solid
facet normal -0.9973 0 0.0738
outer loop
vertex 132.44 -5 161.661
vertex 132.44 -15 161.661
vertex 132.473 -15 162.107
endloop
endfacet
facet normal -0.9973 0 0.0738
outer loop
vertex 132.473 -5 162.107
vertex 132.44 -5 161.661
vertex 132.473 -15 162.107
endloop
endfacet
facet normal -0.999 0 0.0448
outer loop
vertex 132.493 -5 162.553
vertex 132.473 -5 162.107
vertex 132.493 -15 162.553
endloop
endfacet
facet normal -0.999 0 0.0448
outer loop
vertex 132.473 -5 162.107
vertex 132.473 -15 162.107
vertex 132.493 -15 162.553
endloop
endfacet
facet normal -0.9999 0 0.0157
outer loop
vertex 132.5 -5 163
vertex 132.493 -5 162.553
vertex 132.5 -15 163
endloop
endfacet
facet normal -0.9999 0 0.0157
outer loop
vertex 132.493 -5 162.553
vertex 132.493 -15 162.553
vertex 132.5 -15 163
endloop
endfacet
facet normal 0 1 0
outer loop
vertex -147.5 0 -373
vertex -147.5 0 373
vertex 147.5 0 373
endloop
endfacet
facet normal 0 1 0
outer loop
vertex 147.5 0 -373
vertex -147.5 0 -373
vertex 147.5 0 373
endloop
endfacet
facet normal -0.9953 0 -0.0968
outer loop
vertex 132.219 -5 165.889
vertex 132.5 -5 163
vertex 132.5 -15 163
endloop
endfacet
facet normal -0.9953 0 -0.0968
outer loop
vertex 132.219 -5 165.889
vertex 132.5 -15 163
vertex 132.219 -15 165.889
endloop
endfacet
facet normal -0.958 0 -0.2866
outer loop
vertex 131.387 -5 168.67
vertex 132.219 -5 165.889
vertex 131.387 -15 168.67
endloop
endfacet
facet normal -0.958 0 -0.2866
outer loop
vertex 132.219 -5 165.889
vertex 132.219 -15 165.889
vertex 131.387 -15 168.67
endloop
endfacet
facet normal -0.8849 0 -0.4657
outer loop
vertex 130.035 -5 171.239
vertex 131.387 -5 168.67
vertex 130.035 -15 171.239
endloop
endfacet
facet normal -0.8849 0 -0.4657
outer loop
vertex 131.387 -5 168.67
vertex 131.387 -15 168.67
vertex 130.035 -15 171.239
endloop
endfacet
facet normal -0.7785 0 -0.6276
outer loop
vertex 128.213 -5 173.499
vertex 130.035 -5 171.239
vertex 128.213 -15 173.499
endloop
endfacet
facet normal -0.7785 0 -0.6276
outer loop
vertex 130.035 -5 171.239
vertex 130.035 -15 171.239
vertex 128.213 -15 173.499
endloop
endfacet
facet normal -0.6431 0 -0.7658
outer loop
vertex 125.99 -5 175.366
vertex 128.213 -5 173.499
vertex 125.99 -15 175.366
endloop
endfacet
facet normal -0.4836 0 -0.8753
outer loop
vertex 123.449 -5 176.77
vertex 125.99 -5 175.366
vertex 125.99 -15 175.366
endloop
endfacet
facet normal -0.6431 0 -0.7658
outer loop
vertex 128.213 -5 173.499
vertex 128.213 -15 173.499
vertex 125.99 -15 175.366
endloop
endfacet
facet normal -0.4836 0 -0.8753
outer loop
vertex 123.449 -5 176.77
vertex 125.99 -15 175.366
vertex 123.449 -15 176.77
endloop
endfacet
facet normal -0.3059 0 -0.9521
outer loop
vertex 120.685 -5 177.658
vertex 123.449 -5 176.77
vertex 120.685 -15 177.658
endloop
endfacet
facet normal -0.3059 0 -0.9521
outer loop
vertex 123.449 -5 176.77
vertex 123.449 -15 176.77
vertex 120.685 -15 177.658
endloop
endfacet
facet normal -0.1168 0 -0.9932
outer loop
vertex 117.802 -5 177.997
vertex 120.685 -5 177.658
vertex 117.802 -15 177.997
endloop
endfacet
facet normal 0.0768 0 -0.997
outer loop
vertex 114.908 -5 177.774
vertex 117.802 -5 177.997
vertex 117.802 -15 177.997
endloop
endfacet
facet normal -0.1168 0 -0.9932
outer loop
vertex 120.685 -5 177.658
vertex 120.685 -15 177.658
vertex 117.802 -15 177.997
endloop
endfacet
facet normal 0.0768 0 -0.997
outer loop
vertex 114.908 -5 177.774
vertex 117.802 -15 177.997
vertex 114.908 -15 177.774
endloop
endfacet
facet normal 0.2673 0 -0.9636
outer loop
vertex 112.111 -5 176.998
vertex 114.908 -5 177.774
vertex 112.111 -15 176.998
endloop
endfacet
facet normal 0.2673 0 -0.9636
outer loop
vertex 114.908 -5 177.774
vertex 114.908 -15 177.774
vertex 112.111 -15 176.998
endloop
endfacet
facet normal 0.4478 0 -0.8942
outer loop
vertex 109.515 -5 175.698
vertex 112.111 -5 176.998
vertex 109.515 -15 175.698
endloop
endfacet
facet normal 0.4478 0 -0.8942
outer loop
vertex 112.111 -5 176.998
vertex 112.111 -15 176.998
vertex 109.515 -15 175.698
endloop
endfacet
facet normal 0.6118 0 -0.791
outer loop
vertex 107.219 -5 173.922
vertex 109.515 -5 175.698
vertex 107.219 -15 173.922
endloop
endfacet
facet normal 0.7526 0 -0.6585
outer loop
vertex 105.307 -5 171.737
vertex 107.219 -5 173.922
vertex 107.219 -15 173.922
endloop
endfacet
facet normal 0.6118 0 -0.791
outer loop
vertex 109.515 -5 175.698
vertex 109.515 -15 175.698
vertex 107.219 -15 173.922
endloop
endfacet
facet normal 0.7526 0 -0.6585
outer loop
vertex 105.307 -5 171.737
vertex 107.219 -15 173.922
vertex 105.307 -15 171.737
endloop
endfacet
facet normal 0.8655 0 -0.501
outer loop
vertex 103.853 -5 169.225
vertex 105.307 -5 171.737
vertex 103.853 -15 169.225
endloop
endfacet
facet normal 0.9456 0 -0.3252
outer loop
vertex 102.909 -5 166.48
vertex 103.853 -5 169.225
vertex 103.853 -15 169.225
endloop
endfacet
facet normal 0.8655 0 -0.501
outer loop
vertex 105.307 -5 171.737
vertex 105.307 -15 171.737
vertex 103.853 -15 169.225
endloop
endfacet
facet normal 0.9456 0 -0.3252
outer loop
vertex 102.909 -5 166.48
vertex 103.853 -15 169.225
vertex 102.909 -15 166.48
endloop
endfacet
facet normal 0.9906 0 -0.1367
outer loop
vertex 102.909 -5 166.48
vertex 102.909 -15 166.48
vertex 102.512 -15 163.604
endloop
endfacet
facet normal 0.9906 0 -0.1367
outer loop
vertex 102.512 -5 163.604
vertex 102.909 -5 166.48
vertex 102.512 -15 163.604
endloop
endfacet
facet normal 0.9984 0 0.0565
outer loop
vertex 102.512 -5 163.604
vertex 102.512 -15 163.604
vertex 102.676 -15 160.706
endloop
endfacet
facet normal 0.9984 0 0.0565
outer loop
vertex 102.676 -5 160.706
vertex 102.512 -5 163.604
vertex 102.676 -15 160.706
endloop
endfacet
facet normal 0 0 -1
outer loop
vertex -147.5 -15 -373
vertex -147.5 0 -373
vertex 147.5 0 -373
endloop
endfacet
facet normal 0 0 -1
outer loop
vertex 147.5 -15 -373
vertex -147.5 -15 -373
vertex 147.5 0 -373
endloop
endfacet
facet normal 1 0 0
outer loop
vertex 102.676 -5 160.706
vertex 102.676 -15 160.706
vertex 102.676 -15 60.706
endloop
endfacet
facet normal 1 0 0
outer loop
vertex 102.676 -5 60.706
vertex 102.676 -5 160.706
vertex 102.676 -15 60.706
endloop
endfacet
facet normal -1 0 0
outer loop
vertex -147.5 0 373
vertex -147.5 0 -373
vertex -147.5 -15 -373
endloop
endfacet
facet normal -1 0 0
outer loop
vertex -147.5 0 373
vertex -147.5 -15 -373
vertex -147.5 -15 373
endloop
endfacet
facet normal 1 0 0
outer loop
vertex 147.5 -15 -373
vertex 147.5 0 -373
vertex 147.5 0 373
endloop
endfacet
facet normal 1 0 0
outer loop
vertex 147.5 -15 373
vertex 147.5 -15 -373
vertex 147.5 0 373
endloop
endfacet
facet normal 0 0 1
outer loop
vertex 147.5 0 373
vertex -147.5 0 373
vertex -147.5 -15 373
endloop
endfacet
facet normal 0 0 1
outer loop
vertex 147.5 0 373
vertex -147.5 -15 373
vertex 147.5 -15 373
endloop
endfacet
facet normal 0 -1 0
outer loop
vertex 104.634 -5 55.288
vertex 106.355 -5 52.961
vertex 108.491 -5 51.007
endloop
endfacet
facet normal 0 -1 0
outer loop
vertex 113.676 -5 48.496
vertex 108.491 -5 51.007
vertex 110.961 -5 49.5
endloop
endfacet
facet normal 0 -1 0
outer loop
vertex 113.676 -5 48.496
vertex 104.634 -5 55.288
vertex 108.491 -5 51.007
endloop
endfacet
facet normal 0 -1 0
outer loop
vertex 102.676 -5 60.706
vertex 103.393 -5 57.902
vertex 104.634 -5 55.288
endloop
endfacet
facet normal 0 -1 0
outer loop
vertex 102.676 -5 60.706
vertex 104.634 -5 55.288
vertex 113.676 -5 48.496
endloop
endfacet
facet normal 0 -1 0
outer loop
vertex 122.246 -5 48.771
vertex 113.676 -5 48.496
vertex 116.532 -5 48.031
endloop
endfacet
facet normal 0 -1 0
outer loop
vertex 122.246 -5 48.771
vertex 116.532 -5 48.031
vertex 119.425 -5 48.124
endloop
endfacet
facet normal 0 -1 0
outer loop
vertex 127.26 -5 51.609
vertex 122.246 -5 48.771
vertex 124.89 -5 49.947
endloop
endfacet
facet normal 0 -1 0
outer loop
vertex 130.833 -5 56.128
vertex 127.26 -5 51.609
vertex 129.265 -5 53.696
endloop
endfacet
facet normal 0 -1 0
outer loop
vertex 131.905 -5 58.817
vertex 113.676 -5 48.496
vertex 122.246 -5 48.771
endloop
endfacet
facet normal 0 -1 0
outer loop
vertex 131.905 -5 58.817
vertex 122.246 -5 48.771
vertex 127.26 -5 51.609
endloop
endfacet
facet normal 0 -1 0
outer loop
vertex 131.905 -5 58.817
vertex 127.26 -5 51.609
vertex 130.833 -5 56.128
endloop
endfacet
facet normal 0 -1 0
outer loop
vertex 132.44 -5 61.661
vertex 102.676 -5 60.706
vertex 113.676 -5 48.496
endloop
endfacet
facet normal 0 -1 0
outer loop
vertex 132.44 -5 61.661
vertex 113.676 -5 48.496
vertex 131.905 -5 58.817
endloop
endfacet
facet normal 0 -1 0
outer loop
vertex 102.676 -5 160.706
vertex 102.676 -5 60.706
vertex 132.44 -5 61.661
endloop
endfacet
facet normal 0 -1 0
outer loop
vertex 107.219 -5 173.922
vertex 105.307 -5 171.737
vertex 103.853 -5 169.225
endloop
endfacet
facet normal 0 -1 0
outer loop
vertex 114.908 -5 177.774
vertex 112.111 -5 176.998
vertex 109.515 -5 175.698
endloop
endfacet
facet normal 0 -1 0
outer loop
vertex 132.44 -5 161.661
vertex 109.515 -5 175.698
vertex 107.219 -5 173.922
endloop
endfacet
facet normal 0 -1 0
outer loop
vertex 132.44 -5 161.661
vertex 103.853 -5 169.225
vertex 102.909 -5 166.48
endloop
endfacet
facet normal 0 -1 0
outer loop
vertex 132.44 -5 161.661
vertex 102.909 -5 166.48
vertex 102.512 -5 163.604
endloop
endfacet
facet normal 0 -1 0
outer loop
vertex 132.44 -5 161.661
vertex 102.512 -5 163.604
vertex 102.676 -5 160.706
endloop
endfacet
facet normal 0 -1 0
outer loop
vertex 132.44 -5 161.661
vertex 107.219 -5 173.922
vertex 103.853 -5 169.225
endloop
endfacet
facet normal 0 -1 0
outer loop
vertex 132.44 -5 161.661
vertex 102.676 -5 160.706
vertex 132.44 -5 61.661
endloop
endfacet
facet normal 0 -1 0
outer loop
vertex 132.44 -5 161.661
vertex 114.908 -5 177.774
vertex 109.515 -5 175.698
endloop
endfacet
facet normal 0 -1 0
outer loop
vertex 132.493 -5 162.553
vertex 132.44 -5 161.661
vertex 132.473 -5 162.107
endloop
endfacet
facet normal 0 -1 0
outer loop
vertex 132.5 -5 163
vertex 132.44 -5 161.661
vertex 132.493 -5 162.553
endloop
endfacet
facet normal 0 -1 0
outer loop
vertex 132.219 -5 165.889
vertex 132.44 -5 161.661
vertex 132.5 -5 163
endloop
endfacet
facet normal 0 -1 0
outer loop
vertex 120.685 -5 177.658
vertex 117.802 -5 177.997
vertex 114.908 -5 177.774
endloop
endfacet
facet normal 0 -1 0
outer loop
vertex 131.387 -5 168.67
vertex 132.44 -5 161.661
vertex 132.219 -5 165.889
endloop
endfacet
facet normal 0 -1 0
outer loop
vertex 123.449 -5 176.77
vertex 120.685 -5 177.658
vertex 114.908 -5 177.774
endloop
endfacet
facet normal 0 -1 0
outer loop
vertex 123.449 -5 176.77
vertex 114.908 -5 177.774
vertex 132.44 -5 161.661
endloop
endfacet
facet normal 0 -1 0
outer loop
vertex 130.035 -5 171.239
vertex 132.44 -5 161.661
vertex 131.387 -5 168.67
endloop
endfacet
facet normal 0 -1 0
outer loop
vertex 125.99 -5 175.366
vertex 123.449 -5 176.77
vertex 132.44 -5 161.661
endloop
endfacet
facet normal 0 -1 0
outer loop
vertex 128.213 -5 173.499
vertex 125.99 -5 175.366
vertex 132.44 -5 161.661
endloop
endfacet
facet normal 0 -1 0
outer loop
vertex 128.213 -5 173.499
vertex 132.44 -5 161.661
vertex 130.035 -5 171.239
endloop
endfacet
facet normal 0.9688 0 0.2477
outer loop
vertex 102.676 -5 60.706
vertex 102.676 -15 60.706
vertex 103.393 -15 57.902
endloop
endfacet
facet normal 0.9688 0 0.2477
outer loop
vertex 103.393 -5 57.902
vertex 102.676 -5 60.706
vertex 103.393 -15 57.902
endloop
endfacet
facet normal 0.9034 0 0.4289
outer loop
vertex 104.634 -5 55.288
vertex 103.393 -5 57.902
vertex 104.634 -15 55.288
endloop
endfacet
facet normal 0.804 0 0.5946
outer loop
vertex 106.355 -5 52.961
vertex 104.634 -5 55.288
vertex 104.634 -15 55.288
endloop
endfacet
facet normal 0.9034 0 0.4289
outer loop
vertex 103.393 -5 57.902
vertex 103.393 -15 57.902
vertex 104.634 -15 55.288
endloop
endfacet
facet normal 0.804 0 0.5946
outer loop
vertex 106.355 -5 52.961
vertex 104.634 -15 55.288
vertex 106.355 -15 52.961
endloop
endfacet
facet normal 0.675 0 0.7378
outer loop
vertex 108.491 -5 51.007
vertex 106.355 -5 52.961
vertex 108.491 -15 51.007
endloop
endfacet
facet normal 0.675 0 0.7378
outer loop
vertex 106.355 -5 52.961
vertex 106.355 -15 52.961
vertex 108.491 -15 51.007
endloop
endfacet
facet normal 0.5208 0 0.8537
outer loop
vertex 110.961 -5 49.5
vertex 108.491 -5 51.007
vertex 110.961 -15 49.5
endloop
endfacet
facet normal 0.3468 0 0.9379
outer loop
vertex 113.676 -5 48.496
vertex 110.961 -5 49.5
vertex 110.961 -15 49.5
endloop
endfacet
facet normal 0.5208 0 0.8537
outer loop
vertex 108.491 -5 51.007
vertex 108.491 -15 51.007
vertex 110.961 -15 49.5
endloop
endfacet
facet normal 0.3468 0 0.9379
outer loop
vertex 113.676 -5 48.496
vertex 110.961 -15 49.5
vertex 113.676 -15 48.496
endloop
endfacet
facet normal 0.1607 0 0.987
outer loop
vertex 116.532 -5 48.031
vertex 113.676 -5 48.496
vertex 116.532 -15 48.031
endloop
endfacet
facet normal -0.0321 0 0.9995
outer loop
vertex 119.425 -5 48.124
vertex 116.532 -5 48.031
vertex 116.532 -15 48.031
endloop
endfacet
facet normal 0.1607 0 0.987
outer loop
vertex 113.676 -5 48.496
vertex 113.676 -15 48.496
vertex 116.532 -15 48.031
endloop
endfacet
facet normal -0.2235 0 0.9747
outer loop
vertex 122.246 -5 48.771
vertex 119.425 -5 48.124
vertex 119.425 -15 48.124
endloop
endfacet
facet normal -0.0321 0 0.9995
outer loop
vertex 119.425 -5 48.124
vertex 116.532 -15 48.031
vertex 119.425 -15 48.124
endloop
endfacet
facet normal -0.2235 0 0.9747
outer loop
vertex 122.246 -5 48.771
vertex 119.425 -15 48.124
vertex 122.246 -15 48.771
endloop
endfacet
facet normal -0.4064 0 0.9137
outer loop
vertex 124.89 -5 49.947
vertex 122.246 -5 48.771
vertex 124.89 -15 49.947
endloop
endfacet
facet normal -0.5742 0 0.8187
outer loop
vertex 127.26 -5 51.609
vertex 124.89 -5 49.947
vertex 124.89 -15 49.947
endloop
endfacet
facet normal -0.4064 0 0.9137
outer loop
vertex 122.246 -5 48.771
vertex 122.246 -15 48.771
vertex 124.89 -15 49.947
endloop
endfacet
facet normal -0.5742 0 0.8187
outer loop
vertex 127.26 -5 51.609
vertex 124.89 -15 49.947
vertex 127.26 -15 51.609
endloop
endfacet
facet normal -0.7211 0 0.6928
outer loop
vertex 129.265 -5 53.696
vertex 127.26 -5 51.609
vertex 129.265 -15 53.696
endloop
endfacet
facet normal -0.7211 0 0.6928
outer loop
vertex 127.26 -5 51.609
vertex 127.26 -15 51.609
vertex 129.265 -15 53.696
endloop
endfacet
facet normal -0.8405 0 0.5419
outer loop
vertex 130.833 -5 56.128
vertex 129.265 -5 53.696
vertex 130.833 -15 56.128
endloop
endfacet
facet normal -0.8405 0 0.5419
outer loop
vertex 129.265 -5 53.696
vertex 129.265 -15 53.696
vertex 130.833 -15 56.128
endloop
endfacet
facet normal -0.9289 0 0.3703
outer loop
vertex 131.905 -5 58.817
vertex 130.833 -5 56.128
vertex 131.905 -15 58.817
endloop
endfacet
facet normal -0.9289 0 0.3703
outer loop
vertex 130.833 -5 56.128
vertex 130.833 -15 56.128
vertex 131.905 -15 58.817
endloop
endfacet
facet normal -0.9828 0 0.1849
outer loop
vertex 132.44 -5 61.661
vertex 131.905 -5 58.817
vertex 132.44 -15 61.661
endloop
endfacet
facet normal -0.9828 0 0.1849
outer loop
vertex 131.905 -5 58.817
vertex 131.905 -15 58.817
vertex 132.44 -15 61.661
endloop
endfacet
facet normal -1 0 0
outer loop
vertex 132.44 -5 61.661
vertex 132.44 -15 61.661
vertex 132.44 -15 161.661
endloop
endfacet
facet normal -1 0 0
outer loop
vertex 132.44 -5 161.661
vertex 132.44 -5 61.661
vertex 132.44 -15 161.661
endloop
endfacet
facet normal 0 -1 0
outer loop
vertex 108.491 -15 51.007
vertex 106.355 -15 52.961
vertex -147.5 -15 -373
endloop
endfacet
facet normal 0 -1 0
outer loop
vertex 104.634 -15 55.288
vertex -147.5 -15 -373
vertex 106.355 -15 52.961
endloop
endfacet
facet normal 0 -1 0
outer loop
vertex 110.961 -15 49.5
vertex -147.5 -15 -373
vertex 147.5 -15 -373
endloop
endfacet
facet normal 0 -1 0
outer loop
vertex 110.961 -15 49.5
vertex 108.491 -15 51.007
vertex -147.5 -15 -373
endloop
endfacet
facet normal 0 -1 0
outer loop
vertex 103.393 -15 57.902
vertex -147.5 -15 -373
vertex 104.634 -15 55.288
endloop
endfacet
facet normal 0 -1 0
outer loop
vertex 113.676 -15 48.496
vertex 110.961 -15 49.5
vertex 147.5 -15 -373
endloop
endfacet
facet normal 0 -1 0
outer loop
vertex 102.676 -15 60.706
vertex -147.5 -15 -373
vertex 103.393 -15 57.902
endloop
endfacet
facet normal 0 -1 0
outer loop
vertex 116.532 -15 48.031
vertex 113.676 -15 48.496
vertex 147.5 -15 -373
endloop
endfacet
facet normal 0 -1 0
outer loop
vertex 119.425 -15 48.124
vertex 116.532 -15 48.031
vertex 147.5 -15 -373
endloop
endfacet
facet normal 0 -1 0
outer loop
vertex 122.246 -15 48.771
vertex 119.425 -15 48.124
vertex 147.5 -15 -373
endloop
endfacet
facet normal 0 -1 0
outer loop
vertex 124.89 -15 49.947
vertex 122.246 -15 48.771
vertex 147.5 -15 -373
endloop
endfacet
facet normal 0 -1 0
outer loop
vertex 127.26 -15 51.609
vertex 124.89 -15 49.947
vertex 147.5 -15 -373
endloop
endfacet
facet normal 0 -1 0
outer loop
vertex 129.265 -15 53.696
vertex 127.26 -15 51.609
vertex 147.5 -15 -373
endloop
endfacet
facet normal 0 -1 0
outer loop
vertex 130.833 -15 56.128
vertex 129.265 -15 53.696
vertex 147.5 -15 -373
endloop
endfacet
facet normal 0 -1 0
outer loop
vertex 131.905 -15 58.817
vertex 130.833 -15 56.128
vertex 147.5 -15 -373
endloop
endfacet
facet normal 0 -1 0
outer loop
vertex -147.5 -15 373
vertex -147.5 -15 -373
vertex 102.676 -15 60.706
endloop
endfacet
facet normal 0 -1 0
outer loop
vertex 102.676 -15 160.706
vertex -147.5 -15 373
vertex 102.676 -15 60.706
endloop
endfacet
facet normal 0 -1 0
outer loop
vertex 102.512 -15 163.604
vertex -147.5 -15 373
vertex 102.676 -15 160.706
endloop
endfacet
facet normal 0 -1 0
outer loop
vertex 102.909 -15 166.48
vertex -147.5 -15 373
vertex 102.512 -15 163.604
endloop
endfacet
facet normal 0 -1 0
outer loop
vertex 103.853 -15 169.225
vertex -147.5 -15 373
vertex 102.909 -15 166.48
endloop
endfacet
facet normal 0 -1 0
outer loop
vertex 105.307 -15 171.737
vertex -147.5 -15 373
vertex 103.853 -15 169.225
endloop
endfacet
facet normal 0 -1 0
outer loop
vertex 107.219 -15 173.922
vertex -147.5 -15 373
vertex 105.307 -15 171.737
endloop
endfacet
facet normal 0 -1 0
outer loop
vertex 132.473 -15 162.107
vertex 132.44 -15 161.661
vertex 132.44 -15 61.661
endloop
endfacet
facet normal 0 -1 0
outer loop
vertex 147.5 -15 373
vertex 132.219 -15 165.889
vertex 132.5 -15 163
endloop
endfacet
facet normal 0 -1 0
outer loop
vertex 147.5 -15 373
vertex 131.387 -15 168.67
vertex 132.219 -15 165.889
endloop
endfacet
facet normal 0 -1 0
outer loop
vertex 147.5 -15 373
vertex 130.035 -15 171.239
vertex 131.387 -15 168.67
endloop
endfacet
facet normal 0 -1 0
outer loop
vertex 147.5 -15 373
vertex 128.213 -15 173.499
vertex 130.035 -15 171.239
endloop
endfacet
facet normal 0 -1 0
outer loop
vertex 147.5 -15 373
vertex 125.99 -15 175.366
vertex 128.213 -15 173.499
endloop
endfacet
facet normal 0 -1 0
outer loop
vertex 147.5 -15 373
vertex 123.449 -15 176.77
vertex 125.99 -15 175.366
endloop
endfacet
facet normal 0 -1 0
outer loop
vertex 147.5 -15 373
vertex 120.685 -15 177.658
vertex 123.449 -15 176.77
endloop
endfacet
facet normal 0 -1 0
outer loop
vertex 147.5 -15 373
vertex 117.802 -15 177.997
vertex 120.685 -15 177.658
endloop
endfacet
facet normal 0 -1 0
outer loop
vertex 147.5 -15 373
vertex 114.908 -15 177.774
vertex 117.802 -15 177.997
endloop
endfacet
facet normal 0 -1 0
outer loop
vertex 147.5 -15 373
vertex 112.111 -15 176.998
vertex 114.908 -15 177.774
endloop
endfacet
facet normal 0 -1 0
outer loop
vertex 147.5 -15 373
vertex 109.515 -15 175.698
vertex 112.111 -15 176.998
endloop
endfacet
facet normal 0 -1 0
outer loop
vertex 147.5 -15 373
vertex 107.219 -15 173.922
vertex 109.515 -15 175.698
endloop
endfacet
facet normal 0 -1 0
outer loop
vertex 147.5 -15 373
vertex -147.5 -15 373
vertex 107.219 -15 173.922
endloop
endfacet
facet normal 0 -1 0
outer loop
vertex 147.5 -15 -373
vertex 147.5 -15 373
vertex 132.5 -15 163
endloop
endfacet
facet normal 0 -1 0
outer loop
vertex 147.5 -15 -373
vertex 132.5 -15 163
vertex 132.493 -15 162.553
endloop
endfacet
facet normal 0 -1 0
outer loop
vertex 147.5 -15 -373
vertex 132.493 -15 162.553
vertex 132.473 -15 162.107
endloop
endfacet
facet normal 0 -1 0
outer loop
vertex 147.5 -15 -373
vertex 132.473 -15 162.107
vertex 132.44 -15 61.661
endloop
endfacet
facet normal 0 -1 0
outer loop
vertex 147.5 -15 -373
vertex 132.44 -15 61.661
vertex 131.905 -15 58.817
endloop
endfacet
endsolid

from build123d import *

# Parameters (mm, degrees)
F0_W     = 295
F0_H     = 746
F1_DEPTH = 15
F3_DEPTH = 10


with BuildPart() as f1:
    # F0 (on Front) → F1 (new body)
    with BuildSketch(Plane.XZ):
        Rectangle(F0_W, F0_H)
    extrude(amount=F1_DEPTH)

    # F2 (on face) → F3 (cut)
    with BuildSketch(Plane.XZ.offset(15)):
        with BuildLine():
            ThreePointArc((132.4401133717, 161.6609658553), (132.4850208638, 162.3298136735), (132.5, 163))
            ThreePointArc((132.5, 163), (116.3496874374, 177.9558276604), (102.6764291989, 160.7061498078))
            ThreePointArc((102.6764291989, 160.7061498078), (117.9809511033, 148.0077124482), (132.4401133717, 161.6609658553))
        make_face()
        with BuildLine():
            ThreePointArc((132.4401133717, 161.6609658553), (117.9809511033, 148.0077124482), (102.6764291989, 160.7061498078))
            Line((102.6764291989, 160.7061498078), (102.6764291989, 65.2938501922))
            ThreePointArc((102.6764291989, 65.2938501922), (117.9809511033, 77.9922875518), (132.4401133717, 64.3390341447))
            Line((132.4401133717, 64.3390341447), (132.4401133717, 161.6609658553))
        make_face()
        with BuildLine():
            ThreePointArc((132.4401133717, 64.3390341447), (117.9809511033, 77.9922875518), (102.6764291989, 65.2938501922))
            Line((102.6764291989, 65.2938501922), (102.6764291989, 60.7061498078))
            ThreePointArc((102.6764291989, 60.7061498078), (117.9809511033, 48.0077124482), (132.4401133717, 61.6609658553))
            Line((132.4401133717, 61.6609658553), (132.4401133717, 64.3390341447))
        make_face()
    extrude(amount=-F3_DEPTH, mode=Mode.SUBTRACT)


solid = f1.part
